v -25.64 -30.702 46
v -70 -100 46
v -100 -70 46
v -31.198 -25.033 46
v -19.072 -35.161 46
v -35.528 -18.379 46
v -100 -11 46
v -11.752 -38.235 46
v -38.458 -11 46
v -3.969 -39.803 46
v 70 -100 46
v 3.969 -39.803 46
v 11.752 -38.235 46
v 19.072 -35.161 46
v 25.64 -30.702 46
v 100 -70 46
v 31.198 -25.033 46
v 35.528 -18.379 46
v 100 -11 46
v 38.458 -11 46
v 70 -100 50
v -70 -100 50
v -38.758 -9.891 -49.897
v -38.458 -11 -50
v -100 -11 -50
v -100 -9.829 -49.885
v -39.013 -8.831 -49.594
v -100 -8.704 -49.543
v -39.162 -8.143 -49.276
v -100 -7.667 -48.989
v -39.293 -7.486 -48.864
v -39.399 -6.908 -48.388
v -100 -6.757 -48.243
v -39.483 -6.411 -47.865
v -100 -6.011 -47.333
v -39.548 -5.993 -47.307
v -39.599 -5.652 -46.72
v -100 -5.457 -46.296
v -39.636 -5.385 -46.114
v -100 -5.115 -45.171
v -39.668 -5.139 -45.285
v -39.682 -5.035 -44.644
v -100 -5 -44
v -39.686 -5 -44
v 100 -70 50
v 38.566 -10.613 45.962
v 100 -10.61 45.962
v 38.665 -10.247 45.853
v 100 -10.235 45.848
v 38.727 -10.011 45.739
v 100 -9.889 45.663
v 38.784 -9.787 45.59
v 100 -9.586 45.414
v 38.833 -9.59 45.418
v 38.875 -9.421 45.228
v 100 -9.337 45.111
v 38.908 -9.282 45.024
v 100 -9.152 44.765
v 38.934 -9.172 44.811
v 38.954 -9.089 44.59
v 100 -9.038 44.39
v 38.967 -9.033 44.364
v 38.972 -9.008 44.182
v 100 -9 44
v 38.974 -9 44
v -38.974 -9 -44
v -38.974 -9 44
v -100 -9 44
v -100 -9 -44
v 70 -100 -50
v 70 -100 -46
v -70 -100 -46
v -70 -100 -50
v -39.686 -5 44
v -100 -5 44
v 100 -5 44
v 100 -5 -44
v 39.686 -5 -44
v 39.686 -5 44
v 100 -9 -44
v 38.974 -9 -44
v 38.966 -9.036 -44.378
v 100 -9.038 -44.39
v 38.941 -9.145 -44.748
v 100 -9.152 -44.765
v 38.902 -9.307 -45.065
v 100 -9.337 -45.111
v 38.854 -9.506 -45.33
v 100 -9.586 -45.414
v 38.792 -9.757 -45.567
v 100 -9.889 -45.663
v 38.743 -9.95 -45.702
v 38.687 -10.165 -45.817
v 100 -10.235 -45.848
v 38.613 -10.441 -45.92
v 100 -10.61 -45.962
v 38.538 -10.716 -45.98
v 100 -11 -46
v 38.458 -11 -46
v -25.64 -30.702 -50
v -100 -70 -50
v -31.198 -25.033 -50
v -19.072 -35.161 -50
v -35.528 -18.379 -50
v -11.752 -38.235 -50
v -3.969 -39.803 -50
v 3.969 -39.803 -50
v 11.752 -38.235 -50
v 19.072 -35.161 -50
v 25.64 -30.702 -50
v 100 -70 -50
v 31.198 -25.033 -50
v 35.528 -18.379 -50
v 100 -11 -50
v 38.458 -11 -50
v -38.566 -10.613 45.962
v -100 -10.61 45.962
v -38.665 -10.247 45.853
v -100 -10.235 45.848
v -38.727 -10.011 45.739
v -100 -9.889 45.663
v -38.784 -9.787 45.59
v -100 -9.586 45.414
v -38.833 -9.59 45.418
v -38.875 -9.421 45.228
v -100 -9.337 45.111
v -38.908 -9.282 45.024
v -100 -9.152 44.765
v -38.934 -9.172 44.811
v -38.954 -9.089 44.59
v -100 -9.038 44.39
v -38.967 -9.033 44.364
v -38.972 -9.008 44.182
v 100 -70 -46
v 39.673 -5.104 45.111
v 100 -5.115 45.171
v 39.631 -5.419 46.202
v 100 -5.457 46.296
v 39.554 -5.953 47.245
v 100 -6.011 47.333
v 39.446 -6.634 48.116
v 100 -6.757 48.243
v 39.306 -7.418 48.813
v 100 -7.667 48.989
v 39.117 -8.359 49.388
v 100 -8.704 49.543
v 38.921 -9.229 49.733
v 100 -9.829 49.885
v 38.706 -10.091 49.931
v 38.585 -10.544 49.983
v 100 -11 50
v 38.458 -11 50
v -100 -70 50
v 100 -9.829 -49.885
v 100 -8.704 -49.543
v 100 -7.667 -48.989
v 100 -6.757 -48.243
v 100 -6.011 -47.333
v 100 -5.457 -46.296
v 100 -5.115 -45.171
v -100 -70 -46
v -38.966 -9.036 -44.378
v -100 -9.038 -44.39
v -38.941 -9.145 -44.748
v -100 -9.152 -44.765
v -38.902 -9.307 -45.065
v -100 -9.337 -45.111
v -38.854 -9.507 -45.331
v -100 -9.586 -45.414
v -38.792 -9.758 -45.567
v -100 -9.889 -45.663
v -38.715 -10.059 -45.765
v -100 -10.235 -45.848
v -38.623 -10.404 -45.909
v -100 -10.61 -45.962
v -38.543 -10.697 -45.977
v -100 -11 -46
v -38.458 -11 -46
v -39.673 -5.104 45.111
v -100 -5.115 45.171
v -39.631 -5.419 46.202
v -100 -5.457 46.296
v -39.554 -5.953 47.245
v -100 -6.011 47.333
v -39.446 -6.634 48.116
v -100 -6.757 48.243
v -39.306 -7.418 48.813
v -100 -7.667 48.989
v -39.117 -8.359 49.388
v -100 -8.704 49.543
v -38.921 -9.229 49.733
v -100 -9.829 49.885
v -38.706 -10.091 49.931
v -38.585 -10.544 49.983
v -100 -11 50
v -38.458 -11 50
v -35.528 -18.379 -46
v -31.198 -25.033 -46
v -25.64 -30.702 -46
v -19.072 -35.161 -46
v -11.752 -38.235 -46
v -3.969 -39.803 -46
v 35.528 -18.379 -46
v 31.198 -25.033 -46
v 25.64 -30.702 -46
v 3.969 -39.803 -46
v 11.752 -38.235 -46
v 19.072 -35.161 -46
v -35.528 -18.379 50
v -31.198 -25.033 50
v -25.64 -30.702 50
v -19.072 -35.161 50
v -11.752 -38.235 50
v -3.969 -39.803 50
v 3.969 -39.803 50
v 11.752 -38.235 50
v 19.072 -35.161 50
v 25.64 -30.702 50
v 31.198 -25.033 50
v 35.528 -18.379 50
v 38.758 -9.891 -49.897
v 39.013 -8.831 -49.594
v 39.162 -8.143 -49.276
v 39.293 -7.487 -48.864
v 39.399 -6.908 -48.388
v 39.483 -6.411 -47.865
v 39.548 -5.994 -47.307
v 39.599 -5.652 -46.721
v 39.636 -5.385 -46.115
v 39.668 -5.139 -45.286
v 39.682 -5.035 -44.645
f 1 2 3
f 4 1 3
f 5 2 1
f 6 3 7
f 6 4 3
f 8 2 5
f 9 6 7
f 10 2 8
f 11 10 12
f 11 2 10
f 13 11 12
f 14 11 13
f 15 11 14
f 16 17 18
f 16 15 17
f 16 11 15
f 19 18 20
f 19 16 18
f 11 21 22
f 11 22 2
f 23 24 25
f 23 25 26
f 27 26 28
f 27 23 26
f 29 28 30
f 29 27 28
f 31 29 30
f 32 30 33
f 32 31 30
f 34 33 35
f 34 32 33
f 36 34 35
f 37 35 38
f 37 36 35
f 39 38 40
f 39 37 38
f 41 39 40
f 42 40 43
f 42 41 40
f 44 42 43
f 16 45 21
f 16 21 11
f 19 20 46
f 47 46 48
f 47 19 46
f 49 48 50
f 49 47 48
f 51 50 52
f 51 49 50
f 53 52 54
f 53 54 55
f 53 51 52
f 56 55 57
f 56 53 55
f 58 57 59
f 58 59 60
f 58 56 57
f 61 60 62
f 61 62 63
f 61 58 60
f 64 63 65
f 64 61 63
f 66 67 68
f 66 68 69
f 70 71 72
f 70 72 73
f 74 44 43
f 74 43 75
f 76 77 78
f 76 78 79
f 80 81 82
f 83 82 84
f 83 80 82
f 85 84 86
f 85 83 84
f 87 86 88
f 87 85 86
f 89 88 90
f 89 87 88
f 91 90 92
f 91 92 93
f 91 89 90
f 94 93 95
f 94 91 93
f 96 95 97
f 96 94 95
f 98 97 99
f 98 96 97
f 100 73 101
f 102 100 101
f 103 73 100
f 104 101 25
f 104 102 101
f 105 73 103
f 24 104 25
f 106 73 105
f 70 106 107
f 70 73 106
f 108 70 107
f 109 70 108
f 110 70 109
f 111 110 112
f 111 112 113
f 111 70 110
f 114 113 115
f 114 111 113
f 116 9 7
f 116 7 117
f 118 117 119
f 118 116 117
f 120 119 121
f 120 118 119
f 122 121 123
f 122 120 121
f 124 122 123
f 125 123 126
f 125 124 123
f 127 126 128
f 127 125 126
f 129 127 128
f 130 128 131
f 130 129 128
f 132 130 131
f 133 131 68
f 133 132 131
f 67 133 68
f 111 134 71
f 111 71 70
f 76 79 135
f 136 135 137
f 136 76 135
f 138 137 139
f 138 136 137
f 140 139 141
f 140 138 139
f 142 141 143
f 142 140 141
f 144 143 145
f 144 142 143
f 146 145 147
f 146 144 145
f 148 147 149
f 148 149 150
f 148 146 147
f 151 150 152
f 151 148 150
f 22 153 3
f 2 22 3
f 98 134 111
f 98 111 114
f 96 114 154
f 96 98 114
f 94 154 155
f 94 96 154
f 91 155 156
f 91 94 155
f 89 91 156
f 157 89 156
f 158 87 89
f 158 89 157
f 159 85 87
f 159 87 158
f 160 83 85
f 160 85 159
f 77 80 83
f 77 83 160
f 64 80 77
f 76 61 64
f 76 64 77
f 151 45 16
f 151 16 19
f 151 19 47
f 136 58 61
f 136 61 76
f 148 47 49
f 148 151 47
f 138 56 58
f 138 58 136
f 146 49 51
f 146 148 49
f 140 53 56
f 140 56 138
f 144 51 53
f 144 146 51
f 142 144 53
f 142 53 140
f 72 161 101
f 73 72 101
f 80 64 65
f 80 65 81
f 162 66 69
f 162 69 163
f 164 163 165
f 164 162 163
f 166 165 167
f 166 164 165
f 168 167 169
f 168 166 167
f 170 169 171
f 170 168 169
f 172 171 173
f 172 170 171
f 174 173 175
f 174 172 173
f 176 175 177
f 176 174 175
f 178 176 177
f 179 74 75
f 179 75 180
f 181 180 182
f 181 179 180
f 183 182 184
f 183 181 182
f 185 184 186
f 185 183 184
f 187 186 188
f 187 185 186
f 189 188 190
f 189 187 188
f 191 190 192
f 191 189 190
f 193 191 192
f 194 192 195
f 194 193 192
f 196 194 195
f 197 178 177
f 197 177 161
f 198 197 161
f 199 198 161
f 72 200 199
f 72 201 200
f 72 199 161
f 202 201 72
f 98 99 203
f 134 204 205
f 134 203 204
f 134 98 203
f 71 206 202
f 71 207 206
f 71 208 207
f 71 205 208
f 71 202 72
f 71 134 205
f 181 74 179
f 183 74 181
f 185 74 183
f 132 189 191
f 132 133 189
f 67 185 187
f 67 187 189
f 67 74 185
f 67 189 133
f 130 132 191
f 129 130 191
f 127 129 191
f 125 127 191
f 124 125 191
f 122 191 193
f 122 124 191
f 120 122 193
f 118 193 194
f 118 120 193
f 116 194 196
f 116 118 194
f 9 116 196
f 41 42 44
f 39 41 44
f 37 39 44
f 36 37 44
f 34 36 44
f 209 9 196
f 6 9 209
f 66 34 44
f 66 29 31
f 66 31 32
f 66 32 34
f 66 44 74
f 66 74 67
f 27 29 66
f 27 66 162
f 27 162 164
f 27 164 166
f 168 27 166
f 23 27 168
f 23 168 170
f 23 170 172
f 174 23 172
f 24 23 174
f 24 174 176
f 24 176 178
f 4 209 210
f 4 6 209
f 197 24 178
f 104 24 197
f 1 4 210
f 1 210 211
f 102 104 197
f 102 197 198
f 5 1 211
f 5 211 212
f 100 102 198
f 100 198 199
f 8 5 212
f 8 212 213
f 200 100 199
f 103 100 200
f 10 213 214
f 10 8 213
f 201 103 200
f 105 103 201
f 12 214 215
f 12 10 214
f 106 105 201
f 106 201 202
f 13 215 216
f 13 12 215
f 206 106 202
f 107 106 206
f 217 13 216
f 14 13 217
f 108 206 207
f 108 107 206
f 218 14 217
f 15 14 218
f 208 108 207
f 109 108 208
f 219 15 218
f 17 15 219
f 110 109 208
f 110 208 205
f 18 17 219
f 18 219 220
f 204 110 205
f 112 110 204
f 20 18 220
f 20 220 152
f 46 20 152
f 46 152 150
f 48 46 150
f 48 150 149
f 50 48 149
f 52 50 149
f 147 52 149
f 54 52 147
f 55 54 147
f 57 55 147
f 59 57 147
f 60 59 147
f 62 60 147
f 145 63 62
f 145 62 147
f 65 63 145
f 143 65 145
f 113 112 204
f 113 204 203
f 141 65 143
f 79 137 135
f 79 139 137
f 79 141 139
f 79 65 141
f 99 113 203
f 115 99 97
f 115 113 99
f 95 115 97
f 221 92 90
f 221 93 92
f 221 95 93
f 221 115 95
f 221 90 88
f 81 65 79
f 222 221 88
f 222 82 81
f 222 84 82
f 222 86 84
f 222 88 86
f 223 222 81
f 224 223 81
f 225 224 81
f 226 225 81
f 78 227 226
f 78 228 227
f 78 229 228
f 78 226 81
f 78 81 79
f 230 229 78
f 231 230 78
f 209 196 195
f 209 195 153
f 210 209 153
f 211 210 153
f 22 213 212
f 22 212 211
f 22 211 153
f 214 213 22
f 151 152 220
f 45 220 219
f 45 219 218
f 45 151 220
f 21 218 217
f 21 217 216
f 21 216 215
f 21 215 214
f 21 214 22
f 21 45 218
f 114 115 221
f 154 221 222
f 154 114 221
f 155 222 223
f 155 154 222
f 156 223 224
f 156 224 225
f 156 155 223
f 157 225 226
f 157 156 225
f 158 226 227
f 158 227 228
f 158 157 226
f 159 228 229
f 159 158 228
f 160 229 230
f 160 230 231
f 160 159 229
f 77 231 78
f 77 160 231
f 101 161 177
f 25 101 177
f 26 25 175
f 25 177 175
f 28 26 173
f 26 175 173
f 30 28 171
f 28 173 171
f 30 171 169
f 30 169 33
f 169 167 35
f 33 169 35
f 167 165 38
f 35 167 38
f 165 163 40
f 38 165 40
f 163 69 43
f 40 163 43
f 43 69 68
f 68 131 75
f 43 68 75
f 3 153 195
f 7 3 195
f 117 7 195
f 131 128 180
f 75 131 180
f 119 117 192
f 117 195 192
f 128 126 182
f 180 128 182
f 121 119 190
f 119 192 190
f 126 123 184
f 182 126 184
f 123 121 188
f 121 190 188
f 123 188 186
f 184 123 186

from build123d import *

# Parameters (mm, degrees)
F1_DEPTH      = 100
F1_DEPTH_BACK = 100
F2_R          = 40
F3_DEPTH      = 100
F3_DEPTH_BACK = 100
F4_SIZE       = 30


with BuildPart() as f1:
    # F0 (on Right) → F1 (new body, two sides)
    with BuildSketch(Plane.YZ) as f1_sk:
        with BuildLine():
            Line((-5, 0), (-5, 44))
            ThreePointArc((-5, 44), (-6.757359, 48.242641), (-11, 50))
            Line((-11, 50), (-100, 50))
            Line((-100, 50), (-100, 46))
            Line((-100, 46), (-11, 46))
            ThreePointArc((-11, 46), (-9.585786, 45.414214), (-9, 44))
            Line((-9, 44), (-9, 0))
            Line((-9, 0), (-9, -44))
            ThreePointArc((-9, -44), (-9.585786, -45.414214), (-11, -46))
            Line((-11, -46), (-100, -46))
            Line((-100, -46), (-100, -50))
            Line((-100, -50), (-11, -50))
            ThreePointArc((-11, -50), (-6.757359, -48.242641), (-5, -44))
            Line((-5, -44), (-5, 0))
        make_face()
    extrude(amount=F1_DEPTH)
    extrude(f1_sk.sketch, amount=-F1_DEPTH_BACK)

    # F2 (on Top) → F3 (cut, two sides)
    with BuildSketch(Plane.XY) as f3_sk:
        Circle(F2_R)
    extrude(amount=F3_DEPTH, mode=Mode.SUBTRACT)
    extrude(f3_sk.sketch, amount=-F3_DEPTH_BACK, mode=Mode.SUBTRACT)

    # F4
    f4_edges = [f1.edges().sort_by_distance(p)[0] for p in [
        (100, -100, -48),
        (100, -100, 48),
        (-100, -100, -48),
        (-100, -100, 48),
    ]]
    chamfer(f4_edges, length=F4_SIZE)


solid = f1.part
